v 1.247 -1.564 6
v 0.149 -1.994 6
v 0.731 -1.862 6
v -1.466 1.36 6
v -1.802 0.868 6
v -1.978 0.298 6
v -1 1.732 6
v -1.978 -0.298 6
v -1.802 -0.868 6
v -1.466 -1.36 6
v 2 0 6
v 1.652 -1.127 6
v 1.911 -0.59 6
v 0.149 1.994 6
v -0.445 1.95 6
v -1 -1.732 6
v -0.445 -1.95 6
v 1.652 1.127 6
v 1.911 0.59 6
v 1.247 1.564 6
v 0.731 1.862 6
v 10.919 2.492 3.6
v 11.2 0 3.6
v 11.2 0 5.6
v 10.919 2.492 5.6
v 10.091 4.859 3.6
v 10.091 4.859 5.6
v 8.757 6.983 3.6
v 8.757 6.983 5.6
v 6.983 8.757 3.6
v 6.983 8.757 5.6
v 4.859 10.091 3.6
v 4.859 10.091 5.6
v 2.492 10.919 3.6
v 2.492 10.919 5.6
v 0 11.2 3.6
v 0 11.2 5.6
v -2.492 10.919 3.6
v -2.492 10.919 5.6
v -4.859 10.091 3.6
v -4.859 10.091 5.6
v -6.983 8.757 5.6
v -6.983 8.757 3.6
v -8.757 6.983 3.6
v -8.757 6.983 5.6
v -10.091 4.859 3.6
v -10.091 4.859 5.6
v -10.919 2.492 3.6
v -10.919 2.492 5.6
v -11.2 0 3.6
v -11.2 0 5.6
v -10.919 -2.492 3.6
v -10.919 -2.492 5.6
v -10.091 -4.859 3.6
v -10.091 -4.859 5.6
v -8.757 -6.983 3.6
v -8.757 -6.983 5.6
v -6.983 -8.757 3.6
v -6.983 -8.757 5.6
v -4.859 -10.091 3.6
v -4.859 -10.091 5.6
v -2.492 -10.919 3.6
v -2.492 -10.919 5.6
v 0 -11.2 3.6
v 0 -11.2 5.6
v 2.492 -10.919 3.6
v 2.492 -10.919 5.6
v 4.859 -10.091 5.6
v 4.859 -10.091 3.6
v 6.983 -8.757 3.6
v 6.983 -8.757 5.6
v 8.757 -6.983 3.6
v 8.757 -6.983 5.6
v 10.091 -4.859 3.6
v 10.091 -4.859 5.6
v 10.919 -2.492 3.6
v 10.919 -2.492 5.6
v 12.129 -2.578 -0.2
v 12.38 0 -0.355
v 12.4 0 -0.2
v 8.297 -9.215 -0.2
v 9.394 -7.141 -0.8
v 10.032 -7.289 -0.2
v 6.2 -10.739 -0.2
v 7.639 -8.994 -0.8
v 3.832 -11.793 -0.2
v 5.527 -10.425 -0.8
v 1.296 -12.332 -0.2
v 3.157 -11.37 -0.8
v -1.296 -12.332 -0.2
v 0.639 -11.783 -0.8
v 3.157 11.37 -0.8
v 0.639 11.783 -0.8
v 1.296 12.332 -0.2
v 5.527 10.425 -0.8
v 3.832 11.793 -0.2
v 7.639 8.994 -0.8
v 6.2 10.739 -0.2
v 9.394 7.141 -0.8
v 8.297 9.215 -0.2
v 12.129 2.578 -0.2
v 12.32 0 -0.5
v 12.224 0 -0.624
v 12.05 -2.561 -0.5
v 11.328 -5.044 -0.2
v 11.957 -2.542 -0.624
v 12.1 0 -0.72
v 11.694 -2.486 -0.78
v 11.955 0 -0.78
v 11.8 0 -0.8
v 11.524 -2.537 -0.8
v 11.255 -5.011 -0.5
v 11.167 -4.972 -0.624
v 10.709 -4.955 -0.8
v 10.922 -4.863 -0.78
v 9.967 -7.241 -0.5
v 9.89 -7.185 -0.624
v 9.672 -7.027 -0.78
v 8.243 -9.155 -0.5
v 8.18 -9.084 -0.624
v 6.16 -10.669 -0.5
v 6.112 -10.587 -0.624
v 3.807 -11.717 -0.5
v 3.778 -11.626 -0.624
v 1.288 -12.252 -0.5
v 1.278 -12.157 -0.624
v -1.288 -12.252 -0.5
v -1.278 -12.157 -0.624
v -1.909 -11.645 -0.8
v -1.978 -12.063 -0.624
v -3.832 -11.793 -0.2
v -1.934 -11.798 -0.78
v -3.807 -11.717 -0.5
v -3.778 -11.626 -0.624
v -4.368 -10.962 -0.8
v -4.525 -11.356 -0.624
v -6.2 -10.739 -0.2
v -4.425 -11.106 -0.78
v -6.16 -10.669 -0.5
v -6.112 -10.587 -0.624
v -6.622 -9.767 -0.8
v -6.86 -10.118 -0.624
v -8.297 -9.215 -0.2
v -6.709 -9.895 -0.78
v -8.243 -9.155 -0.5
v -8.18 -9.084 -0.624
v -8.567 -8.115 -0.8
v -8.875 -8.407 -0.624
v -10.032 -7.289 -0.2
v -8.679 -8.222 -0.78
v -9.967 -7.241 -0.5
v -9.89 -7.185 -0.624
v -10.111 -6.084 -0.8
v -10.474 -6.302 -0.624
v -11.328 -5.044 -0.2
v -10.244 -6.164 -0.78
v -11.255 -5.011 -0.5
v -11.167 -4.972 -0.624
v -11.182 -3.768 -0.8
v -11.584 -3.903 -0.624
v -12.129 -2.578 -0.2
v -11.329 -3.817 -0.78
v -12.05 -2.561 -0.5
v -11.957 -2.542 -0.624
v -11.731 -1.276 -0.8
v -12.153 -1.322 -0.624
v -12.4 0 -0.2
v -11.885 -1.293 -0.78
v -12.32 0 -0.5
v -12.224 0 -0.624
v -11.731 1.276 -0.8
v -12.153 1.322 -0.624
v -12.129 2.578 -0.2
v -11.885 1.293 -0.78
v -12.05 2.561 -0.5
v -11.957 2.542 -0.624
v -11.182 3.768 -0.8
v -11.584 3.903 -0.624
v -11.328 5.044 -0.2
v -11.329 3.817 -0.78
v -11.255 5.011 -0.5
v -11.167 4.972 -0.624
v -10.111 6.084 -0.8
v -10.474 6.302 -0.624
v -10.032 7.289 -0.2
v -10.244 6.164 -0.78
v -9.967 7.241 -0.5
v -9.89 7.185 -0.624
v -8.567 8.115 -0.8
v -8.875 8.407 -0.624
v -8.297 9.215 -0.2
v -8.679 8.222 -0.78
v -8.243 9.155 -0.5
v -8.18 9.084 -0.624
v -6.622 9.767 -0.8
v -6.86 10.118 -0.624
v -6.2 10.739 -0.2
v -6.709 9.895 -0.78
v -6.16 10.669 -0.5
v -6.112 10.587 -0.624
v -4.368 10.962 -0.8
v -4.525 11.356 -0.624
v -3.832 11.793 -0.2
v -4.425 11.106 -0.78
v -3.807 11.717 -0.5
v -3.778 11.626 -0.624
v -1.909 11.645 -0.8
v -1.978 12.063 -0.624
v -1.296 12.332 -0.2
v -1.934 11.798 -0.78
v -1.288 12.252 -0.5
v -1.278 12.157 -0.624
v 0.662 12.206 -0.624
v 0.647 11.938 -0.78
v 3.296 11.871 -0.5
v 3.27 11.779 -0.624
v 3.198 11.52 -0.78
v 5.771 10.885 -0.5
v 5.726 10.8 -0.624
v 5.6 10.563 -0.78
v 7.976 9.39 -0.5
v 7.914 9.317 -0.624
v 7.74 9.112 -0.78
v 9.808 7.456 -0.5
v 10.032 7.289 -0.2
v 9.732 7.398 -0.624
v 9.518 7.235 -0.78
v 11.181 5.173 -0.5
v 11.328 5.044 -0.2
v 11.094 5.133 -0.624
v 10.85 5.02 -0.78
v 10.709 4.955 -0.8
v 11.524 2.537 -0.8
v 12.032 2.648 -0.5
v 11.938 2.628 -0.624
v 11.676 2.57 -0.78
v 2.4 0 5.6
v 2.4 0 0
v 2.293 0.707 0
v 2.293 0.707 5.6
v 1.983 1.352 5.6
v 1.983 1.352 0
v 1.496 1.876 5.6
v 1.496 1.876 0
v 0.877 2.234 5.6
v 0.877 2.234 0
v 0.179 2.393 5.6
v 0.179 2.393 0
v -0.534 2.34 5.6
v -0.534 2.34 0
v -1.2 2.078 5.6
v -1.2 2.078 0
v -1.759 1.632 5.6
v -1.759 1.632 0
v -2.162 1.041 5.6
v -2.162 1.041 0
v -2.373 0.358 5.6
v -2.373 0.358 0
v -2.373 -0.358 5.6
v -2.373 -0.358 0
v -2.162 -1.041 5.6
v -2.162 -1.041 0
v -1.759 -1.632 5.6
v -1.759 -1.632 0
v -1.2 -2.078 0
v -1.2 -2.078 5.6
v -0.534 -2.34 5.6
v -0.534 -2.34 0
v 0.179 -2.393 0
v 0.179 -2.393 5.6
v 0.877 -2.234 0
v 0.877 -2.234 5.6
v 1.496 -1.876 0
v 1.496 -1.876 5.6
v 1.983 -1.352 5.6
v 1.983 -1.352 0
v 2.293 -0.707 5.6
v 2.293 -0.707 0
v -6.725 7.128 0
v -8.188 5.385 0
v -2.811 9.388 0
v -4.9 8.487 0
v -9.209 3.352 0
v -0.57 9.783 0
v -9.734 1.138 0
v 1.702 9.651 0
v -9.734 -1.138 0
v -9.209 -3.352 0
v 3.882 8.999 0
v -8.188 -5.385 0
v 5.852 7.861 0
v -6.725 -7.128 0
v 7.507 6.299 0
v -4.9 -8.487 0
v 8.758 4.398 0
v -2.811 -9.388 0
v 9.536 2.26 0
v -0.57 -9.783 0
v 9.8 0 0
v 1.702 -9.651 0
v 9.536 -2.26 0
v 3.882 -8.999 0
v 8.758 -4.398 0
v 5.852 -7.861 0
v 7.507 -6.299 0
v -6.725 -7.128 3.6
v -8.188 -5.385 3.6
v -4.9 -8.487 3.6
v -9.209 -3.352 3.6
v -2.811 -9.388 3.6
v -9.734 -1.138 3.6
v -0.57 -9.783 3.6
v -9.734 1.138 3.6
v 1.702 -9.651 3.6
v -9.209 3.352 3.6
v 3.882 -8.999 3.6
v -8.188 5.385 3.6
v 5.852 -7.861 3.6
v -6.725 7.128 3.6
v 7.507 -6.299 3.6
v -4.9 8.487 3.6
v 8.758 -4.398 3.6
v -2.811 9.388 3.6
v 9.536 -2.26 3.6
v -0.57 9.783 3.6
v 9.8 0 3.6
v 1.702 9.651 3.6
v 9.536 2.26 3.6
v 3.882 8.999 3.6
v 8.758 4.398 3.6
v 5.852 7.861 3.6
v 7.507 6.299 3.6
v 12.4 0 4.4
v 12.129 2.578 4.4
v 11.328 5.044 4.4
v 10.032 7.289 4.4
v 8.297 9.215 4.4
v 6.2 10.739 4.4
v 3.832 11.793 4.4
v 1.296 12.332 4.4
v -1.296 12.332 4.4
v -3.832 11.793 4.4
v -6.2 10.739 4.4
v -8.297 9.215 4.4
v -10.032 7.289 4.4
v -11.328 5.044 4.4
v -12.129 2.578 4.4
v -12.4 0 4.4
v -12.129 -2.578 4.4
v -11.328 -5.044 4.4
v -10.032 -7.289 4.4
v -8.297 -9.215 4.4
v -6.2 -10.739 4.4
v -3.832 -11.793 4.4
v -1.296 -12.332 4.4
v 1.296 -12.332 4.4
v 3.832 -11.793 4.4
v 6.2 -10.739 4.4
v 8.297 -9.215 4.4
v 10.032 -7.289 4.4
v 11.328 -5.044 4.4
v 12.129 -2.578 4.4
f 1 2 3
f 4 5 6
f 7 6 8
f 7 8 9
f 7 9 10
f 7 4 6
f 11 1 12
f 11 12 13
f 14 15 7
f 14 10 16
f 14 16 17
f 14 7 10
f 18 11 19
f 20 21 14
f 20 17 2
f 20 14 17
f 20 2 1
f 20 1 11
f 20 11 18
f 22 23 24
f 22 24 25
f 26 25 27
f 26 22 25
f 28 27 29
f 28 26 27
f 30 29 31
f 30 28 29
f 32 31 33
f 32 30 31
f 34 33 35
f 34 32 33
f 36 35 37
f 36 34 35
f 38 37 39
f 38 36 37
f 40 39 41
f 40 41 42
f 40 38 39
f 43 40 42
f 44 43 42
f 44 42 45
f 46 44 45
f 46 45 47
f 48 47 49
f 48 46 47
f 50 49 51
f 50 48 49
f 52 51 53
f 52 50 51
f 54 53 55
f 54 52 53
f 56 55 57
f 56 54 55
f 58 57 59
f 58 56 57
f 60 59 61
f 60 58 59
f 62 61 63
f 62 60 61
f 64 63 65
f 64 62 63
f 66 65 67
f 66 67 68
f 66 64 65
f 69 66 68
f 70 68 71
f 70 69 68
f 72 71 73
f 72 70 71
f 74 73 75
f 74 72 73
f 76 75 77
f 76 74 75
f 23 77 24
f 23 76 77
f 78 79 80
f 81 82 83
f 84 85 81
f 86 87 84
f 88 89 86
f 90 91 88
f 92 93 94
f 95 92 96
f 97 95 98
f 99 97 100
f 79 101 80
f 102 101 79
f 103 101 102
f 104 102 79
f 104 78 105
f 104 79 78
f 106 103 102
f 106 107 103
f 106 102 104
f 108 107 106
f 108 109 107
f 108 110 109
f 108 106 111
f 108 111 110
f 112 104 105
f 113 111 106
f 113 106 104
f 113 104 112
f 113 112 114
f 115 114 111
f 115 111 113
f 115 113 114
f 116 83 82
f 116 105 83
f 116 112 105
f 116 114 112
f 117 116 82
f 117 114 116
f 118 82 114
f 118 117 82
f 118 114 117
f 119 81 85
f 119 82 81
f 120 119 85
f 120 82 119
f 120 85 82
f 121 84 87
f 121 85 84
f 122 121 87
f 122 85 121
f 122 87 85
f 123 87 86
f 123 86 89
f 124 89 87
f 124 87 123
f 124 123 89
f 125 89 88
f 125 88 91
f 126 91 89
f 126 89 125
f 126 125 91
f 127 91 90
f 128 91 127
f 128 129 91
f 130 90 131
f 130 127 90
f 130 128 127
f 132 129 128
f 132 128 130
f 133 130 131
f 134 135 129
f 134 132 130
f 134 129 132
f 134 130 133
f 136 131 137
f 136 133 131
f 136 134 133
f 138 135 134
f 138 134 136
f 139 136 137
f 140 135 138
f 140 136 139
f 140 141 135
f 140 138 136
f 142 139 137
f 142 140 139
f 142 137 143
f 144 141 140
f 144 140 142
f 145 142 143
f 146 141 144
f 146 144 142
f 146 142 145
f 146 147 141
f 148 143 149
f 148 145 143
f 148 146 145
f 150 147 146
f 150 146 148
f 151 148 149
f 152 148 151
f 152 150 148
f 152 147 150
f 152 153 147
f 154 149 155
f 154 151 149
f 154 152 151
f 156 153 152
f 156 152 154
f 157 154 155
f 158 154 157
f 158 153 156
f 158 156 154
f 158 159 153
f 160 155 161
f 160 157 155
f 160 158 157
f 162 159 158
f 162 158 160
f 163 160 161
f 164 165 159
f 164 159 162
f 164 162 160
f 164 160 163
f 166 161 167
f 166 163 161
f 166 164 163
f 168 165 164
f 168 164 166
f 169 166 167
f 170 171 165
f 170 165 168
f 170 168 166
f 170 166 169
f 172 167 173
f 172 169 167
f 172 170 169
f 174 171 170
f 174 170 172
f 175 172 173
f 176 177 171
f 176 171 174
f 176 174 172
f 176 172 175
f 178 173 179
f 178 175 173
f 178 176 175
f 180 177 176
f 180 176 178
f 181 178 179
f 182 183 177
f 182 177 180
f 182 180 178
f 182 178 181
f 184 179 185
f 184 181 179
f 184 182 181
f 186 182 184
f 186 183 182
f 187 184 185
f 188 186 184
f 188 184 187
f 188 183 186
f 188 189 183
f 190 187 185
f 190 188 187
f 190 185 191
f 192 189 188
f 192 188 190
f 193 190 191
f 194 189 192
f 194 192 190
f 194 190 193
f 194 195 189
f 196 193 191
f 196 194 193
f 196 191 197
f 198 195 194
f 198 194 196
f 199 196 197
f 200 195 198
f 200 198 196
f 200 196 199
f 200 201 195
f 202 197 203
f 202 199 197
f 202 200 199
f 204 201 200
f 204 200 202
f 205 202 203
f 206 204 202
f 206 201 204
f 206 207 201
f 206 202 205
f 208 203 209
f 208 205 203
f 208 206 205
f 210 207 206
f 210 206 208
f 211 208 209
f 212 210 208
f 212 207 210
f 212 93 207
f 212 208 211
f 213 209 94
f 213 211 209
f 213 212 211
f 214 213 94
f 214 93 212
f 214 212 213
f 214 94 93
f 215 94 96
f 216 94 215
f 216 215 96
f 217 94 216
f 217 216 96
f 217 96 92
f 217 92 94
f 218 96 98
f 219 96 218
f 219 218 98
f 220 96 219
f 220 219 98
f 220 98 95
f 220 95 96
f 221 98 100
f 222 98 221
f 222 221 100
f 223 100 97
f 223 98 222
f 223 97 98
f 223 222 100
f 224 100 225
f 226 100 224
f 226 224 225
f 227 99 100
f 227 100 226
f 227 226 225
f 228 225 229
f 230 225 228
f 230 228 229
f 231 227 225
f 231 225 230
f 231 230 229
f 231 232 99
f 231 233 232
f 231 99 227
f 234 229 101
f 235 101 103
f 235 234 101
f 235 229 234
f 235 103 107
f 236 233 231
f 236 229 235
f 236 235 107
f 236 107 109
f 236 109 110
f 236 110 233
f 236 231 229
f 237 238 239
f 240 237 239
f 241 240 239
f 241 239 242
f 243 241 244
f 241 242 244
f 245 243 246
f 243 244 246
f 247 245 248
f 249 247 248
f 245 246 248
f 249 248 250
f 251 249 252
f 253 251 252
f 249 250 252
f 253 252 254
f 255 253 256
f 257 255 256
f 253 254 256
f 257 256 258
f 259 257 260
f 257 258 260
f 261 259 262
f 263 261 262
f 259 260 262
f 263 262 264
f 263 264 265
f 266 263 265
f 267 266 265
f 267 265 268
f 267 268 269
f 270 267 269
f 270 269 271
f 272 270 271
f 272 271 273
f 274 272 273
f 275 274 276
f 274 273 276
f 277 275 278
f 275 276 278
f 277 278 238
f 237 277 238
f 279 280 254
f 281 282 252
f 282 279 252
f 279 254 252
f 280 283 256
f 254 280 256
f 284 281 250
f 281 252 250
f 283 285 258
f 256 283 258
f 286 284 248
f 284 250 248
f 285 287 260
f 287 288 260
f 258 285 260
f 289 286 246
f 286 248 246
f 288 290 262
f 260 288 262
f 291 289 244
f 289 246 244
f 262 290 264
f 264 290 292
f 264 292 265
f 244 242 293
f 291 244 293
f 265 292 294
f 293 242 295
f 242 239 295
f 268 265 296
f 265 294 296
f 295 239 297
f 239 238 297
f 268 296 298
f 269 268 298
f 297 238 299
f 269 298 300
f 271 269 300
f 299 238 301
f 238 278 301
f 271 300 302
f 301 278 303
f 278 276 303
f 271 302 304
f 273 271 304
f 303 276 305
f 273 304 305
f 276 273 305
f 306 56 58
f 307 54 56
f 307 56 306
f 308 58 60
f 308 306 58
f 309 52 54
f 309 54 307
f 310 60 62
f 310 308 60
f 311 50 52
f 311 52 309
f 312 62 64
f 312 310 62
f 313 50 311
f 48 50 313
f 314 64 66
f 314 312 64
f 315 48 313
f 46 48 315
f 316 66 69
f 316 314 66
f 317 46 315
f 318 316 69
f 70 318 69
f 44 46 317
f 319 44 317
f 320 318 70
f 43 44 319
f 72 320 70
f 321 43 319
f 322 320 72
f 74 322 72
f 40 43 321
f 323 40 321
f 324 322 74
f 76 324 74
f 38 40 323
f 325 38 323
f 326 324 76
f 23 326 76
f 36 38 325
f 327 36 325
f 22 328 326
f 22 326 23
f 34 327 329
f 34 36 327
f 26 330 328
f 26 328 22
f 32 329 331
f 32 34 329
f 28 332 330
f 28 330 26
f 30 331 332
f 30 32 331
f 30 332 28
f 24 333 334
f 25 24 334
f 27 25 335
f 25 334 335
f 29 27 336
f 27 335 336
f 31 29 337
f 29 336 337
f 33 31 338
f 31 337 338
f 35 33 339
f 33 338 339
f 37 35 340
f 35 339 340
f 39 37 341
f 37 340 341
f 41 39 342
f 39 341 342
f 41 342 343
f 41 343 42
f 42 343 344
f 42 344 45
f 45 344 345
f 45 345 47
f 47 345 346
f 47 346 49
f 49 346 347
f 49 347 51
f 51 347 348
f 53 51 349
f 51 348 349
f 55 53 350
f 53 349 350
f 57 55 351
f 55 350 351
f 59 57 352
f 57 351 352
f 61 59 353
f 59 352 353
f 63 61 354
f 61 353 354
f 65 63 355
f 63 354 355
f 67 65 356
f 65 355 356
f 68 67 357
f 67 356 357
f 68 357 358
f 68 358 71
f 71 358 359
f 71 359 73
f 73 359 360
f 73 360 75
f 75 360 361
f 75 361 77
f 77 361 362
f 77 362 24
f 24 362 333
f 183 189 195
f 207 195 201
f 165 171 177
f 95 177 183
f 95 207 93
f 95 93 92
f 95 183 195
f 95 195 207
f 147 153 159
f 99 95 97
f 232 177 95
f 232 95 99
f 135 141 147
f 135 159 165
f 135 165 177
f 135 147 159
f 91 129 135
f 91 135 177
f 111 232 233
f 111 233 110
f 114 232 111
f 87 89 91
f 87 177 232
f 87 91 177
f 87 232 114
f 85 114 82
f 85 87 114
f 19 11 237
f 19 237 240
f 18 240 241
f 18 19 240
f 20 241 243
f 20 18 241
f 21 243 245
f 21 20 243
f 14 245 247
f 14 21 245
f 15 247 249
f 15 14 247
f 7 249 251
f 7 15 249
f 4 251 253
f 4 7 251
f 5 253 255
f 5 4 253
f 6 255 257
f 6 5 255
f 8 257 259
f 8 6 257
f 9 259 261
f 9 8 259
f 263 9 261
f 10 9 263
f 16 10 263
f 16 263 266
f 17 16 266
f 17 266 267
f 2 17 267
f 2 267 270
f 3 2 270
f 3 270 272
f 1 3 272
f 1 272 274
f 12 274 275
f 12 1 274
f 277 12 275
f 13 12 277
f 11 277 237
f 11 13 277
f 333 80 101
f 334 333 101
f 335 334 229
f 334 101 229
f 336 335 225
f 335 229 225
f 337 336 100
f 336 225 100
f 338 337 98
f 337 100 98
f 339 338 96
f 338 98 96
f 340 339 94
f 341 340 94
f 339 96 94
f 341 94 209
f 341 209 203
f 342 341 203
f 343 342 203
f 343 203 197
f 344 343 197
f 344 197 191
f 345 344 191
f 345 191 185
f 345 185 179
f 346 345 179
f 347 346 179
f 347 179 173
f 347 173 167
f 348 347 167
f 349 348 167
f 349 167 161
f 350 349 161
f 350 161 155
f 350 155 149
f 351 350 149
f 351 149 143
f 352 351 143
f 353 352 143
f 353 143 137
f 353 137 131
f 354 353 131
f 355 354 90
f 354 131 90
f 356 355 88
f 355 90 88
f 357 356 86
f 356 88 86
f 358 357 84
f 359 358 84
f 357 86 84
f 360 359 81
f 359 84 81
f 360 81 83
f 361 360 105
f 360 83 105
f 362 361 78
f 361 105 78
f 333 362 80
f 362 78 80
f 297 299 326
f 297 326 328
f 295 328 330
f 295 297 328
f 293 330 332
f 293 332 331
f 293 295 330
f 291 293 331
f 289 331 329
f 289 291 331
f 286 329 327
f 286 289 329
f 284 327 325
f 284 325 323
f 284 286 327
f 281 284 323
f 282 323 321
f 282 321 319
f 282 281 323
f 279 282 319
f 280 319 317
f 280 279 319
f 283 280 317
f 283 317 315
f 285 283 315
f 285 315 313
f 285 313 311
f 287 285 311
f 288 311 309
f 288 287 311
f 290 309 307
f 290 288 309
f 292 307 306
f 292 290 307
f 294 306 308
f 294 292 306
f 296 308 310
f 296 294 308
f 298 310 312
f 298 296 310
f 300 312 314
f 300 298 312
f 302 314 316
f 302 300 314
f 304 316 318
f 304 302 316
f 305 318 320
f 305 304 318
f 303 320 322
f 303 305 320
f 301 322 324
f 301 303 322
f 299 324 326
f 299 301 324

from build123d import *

# Parameters (mm, degrees)
F0_R     = 12.4
F0_R_2   = 9.8
F1_DEPTH = 3.6
F2_R     = 12.4
F2_R_2   = 9.8
F3_DEPTH = 0.8
F4_R     = 12.4
F4_R_2   = 11.2
F5_DEPTH = 2
F6_R     = 0.6
F7_R     = 2.4
F8_DEPTH = 6
F9_SIZE  = 0.4


# Not quite as in the source:
# - a fillet or chamfer that OpenCascade refuses, or shapes differently, is made with other operations: its cross-section is extruded or revolved along the edge and cut away or added


with BuildPart() as f1:
    # F0 (on Top) → F1 (new body)
    with BuildSketch(Plane.XY):
        Circle(F0_R)
        Circle(F0_R_2, mode=Mode.SUBTRACT)
    extrude(amount=F1_DEPTH)

    # F2 (on face) → F3 (join)
    with BuildSketch(Plane(origin=(0, 0, 0), x_dir=(1, 0, 0), z_dir=(0, 0, -1))):
        Circle(F2_R)
        Circle(F2_R_2, mode=Mode.SUBTRACT)
        Circle(F2_R_2)
    extrude(amount=F3_DEPTH)

    # F4 (on face) → F5 (join)
    with BuildSketch(Plane.XY.offset(3.6)):
        Circle(F4_R)
        Circle(F4_R_2, mode=Mode.SUBTRACT)
    extrude(amount=F5_DEPTH)

    # F6
    f6_edges = [f1.edges().sort_by_distance(p)[0] for p in [
        (-12.4, 0, -0.8),
    ]]
    fillet(f6_edges, radius=F6_R)

    # F7 (on face) → F8 (join)
    with BuildSketch(Plane.XY):
        Circle(F7_R)
    extrude(amount=F8_DEPTH)

    # F9
    f9_edges = [f1.edges().sort_by_distance(p)[0] for p in [
        (-2.4, 0, 6),
    ]]
    chamfer(f9_edges, length=F9_SIZE)

    # F10: chamfer of 1.2 on 1 edges, made by hand

    # F10_s1 → F10_t2 (revolve, cut)
    with BuildSketch(Plane.XZ):
        Polygon((11.2, 5.6), (12.4, 4.4), (12.4, 5.6), align=None)
    revolve(axis=Axis((0, 0, 5.6), (0, 0, 1)), mode=Mode.SUBTRACT)


solid = f1.part
